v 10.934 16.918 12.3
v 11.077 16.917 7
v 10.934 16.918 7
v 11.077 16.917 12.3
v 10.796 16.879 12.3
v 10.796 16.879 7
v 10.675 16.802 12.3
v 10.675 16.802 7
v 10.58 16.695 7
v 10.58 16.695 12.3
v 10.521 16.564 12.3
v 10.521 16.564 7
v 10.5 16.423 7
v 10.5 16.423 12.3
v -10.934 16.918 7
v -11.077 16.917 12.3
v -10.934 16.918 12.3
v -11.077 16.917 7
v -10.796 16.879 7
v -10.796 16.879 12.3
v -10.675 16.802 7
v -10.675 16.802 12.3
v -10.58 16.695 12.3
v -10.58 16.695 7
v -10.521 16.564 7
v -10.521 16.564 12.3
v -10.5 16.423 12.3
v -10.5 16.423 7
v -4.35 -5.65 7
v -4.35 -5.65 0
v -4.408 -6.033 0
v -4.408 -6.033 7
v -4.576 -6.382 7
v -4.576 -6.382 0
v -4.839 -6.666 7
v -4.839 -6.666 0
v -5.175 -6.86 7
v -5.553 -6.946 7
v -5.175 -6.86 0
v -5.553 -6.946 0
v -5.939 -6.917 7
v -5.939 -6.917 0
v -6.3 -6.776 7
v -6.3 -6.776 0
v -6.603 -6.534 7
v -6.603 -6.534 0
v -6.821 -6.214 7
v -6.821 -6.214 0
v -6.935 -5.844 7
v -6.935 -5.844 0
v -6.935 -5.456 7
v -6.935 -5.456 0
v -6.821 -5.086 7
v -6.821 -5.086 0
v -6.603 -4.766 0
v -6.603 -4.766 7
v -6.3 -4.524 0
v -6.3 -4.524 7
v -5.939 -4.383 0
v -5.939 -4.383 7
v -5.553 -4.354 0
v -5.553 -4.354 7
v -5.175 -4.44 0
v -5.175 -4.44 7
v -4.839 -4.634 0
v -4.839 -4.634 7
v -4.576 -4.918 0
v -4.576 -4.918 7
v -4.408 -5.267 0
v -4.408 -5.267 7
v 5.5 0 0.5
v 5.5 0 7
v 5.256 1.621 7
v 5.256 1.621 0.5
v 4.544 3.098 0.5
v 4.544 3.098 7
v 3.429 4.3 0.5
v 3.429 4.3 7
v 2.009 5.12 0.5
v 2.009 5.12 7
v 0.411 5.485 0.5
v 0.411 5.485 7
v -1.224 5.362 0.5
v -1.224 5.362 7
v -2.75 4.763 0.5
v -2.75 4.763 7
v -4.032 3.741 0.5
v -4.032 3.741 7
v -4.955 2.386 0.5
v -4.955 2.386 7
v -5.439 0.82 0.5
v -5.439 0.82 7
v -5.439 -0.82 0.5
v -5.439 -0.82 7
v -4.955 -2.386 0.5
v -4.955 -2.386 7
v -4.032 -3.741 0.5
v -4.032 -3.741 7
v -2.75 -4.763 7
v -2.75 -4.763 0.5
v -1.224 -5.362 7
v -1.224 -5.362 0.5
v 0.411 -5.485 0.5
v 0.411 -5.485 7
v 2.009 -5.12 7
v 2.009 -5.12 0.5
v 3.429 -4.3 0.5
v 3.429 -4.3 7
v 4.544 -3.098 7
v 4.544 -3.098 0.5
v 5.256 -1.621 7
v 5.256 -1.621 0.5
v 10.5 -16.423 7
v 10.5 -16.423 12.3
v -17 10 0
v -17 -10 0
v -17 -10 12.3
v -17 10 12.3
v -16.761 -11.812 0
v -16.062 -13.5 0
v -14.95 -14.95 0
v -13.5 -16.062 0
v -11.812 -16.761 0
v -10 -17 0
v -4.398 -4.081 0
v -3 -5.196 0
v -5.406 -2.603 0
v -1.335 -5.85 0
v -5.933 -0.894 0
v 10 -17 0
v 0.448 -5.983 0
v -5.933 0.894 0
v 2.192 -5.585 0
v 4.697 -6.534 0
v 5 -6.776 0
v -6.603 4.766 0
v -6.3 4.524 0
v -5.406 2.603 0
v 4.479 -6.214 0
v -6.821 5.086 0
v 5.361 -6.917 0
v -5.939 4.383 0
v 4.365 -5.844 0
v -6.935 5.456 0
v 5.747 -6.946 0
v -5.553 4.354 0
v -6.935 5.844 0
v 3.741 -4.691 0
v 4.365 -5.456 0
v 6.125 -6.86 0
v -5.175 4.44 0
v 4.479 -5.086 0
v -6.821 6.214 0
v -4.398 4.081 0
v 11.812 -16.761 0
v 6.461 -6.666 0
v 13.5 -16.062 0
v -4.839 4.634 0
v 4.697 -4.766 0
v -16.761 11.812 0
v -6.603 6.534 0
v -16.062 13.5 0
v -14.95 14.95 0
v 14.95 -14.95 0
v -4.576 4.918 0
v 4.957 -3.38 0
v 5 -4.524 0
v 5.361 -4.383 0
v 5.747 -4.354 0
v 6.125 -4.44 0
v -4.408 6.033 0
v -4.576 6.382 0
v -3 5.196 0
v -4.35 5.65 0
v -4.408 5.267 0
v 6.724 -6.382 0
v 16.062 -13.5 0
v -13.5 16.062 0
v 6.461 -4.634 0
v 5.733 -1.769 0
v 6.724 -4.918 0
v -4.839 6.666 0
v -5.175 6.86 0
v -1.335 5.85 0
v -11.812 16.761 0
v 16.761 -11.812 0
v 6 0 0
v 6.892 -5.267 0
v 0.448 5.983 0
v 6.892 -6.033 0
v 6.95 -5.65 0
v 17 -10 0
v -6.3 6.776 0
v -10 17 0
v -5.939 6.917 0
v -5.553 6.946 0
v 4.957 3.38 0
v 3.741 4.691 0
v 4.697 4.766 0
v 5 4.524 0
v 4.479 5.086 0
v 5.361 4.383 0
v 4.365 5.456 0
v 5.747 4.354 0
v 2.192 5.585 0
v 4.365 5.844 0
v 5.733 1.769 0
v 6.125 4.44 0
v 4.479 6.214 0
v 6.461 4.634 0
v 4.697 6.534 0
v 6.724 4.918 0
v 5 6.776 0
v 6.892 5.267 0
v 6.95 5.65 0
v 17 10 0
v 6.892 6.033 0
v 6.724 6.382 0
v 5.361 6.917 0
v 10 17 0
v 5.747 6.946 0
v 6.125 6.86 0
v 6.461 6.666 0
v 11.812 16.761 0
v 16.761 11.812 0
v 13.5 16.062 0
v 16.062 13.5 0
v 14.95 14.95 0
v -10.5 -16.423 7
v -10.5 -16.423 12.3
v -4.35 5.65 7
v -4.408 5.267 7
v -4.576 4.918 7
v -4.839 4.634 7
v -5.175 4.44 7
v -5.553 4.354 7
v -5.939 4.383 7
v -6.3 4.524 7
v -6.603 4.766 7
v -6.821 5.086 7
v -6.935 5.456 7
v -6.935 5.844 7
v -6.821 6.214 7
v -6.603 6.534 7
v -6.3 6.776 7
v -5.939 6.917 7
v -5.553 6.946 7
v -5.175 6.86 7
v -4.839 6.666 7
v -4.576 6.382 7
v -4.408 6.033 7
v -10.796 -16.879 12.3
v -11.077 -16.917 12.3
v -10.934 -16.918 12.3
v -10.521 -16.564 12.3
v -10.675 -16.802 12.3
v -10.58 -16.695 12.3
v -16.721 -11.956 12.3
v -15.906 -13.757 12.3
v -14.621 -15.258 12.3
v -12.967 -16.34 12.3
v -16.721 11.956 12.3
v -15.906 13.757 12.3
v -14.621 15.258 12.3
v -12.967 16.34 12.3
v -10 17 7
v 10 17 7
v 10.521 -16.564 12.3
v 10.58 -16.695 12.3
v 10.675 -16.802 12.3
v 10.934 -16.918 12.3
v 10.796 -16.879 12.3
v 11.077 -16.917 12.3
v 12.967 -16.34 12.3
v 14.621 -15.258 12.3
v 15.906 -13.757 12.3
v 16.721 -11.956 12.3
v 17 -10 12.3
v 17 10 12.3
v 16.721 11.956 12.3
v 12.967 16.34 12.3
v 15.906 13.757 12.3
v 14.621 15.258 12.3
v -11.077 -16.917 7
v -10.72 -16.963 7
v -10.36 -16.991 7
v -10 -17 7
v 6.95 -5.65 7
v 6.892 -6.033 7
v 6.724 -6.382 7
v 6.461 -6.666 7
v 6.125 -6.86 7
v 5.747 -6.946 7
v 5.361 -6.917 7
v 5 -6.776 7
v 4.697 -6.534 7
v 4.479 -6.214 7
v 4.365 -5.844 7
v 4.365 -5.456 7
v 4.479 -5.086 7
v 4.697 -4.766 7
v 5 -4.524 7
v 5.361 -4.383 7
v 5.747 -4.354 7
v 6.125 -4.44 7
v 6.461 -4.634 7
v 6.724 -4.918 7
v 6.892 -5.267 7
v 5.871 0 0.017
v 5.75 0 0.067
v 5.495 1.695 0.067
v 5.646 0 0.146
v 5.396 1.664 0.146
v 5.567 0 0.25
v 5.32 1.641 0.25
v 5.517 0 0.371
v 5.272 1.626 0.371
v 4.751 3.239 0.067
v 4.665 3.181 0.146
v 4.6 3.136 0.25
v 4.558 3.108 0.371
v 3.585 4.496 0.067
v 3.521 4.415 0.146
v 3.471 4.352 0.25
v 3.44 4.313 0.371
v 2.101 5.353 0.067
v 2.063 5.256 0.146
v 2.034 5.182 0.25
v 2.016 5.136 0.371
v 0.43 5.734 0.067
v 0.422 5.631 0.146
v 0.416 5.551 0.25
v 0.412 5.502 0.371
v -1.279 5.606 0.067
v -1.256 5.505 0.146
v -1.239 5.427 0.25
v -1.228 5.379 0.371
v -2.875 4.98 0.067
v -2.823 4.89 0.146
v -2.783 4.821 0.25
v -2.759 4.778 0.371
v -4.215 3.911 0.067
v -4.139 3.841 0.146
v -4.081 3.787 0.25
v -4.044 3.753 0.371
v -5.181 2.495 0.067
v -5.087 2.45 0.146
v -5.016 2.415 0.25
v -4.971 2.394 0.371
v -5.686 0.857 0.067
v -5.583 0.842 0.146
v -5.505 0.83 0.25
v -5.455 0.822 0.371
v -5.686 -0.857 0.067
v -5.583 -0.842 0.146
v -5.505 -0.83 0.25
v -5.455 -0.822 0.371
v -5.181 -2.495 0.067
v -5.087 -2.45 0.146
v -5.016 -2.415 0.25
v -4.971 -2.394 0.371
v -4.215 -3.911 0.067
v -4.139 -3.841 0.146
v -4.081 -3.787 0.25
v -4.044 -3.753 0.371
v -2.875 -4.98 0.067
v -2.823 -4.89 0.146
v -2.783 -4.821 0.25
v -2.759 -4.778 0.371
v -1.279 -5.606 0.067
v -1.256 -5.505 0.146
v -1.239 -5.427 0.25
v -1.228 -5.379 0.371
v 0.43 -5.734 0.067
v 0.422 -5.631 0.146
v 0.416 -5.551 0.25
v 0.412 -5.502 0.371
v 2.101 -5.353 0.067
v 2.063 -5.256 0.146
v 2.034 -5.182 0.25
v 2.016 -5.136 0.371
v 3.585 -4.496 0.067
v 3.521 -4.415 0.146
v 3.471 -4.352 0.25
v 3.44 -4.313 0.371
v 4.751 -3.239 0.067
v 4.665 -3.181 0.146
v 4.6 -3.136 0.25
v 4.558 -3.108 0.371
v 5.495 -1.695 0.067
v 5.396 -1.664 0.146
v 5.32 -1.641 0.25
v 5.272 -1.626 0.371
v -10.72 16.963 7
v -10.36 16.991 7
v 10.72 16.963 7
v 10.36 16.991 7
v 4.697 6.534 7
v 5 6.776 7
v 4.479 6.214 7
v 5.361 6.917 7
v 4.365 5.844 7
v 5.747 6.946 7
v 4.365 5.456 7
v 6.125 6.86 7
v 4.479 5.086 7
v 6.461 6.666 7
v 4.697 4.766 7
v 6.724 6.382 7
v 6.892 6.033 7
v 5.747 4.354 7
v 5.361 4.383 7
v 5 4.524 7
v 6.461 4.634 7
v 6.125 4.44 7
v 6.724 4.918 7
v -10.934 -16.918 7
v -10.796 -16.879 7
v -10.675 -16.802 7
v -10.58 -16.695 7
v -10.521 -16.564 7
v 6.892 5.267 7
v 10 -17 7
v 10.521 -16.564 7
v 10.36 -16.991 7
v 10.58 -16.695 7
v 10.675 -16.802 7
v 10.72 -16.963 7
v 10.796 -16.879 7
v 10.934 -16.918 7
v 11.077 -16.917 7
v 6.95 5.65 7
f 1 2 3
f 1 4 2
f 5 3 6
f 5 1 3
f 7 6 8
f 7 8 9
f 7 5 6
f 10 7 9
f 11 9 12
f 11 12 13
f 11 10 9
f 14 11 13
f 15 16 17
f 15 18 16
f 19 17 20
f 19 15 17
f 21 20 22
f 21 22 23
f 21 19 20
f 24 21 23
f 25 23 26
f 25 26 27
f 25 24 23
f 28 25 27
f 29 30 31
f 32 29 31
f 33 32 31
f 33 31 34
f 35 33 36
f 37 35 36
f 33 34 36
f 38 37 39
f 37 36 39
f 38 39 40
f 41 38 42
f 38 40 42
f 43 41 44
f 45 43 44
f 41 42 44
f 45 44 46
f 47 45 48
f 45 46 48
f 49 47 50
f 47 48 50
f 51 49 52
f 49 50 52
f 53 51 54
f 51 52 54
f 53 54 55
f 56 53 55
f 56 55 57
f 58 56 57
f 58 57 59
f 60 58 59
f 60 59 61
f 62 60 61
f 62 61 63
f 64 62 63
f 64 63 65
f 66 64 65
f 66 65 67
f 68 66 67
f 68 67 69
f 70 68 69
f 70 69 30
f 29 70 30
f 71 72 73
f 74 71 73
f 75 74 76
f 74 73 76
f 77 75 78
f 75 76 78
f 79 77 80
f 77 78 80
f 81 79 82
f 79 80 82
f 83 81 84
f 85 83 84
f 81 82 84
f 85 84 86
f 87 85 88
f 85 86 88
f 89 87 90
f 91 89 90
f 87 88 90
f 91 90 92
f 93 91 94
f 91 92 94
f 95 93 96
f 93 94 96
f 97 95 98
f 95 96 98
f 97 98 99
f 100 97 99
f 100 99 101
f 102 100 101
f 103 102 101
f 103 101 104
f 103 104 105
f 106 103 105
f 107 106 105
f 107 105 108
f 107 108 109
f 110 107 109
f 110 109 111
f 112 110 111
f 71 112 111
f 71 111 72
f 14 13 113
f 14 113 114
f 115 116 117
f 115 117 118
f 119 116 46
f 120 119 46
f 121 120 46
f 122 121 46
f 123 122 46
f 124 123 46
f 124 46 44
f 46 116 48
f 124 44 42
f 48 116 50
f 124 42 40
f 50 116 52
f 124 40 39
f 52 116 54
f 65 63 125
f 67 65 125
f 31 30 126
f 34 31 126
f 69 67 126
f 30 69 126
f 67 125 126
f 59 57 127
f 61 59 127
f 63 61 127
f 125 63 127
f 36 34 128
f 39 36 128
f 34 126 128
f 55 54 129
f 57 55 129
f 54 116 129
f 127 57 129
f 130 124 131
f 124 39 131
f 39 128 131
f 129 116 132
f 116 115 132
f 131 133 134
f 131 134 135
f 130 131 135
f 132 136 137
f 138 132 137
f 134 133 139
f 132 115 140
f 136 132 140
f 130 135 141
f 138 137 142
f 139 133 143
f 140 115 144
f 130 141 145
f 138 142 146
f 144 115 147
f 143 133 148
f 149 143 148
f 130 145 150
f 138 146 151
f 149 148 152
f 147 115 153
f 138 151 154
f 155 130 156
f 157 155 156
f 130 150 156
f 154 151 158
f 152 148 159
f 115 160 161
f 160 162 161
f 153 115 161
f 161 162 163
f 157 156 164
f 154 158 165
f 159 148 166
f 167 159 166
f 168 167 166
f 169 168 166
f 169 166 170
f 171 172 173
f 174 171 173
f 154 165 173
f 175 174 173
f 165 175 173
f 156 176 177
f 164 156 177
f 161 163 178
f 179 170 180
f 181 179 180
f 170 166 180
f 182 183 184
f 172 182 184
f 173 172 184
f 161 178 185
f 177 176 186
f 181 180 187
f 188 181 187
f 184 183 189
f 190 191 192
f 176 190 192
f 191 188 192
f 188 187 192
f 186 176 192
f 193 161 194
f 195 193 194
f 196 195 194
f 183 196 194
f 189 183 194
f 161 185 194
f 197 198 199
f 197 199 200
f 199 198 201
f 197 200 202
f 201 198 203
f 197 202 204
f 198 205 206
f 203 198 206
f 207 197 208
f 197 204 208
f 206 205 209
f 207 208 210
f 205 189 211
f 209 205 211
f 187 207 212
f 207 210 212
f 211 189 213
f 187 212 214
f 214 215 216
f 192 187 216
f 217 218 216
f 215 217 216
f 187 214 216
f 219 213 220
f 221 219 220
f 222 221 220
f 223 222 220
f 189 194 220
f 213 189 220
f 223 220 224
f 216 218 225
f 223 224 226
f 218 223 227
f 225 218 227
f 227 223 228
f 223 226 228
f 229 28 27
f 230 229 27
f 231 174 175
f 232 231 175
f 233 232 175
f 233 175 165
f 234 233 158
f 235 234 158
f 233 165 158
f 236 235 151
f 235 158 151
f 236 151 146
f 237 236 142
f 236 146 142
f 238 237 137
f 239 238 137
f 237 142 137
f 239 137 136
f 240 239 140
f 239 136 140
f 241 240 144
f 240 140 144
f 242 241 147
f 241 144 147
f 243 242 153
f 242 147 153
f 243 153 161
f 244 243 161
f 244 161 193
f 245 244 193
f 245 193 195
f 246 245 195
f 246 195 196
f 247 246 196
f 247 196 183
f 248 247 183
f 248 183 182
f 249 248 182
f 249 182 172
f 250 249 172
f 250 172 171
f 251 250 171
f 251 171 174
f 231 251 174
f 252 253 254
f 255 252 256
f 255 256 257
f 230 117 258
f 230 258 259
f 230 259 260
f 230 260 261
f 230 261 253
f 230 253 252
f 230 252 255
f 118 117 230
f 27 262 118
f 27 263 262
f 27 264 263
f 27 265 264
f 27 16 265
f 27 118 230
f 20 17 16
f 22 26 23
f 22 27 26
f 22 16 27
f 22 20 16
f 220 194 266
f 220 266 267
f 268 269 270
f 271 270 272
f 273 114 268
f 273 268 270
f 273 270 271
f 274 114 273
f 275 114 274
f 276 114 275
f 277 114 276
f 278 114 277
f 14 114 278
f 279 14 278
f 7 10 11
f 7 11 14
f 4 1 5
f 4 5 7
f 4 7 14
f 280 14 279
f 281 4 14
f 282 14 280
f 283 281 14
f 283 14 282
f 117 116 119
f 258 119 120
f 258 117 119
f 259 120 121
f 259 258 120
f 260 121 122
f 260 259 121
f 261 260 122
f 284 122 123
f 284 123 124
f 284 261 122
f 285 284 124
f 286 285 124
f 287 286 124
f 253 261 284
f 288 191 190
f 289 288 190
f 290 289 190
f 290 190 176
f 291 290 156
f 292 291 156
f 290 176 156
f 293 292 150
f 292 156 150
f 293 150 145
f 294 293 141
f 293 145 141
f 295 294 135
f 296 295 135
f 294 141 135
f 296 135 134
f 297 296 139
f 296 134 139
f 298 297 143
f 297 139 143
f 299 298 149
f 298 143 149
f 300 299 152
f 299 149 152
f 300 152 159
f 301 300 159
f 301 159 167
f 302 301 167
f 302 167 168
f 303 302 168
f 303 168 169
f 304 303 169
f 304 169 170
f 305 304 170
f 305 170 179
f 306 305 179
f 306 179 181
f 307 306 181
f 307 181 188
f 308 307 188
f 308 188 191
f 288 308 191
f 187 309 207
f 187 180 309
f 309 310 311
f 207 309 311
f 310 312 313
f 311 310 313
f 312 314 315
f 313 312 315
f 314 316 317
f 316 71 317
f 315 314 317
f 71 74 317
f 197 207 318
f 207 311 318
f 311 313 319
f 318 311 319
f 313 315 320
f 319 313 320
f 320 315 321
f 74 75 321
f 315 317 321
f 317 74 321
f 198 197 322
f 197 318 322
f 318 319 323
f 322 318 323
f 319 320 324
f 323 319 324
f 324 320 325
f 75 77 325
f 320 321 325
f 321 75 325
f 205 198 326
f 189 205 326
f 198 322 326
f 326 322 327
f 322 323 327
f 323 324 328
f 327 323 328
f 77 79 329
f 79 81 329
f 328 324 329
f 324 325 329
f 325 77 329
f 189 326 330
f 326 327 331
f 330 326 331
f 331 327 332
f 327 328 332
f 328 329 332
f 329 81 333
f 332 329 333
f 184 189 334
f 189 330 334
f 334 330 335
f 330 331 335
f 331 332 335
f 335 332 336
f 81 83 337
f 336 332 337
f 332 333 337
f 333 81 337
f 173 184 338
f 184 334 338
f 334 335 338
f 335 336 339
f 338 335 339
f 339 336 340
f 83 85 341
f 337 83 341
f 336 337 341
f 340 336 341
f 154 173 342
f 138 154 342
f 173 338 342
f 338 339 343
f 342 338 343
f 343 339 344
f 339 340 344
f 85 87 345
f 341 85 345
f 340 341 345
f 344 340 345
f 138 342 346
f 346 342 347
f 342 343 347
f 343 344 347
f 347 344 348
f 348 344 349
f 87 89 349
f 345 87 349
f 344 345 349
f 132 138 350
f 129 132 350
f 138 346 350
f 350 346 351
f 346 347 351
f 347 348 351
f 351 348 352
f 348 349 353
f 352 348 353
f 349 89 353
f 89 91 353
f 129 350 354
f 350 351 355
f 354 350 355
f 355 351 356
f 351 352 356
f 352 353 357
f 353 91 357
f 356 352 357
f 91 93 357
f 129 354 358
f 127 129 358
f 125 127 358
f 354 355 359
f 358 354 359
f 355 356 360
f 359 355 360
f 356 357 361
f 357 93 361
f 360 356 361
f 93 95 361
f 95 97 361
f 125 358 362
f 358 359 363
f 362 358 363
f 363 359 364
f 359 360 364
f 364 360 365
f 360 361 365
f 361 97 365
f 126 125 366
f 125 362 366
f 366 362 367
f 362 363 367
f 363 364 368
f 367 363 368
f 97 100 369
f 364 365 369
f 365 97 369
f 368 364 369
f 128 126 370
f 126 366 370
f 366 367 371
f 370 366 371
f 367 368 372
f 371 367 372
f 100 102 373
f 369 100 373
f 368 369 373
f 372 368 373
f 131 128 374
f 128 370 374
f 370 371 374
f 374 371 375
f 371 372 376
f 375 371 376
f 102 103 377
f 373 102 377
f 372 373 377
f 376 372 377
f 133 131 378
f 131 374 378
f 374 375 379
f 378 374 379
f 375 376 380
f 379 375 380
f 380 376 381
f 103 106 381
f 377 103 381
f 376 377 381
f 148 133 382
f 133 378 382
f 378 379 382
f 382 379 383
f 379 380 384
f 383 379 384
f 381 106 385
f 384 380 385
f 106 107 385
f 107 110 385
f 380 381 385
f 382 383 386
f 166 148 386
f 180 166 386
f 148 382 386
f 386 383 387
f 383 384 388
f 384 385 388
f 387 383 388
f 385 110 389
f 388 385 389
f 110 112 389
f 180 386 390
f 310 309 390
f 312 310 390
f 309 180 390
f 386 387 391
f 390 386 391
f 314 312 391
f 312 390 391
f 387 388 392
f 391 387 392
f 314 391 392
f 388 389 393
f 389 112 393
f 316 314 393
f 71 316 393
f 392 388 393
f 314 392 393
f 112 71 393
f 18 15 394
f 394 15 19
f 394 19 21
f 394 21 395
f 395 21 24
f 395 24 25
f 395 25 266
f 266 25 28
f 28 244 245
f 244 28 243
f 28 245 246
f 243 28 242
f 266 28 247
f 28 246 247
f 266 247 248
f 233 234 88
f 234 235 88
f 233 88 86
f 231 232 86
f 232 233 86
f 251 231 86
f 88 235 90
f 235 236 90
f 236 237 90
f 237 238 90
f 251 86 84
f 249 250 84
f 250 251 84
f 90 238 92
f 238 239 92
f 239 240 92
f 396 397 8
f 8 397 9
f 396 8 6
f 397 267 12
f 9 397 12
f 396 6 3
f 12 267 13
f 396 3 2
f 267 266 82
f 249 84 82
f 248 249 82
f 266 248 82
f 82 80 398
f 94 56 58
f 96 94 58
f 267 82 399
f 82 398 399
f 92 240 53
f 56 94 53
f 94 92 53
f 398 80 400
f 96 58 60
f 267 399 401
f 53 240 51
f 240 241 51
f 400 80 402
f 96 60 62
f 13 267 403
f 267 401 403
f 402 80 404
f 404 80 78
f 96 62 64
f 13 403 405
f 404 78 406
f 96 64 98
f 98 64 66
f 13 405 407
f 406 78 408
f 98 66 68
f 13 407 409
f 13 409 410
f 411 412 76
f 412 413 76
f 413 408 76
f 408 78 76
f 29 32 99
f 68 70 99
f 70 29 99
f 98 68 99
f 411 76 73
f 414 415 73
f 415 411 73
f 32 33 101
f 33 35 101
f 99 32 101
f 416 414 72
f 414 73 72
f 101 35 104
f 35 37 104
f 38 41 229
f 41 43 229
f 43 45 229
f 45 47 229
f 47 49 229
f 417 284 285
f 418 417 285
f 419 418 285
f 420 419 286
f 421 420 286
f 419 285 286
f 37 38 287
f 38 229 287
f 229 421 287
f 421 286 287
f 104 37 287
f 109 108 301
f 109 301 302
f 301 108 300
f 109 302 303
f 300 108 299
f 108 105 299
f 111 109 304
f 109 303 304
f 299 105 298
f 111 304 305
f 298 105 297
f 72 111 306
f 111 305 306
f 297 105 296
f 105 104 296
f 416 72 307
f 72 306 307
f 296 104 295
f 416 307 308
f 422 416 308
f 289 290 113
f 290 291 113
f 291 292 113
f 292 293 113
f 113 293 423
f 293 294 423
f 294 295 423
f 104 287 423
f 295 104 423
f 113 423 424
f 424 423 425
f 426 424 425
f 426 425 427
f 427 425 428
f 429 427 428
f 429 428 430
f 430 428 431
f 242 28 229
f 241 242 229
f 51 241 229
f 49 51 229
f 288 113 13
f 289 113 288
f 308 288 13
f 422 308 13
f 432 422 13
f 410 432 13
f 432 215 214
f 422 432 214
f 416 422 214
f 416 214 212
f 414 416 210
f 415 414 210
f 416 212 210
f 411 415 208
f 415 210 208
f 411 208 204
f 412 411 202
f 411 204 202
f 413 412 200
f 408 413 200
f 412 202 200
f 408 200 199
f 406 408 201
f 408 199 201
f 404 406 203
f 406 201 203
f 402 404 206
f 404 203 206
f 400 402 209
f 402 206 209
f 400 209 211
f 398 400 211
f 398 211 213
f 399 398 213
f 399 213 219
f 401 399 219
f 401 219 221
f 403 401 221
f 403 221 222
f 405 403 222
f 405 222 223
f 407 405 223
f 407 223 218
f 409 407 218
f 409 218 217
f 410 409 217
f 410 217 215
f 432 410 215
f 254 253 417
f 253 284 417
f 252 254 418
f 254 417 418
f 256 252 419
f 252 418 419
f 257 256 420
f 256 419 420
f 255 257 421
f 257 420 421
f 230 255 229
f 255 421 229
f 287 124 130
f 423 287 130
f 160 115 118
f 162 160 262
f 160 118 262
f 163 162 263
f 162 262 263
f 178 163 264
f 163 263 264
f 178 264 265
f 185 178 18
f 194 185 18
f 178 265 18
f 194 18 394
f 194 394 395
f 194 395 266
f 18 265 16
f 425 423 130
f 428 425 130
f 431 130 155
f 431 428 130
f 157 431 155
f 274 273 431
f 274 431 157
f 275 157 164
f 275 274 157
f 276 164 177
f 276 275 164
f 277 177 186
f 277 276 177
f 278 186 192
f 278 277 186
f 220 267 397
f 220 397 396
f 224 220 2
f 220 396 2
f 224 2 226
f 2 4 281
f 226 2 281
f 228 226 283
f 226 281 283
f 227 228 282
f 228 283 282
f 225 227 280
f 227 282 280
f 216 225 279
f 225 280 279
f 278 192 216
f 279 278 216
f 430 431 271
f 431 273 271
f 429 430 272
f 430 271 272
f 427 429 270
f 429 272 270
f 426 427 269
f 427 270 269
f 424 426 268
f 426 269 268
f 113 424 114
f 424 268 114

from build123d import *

# Parameters (mm, degrees)
F0_W     = 34
F0_H     = 34
F1_DEPTH = 12.3
F2_R     = 5.5
F3_DEPTH = 12.301
F4_R     = 1.3
F5_DEPTH = 12.301
F6_W     = 21
F6_H     = 5.3
F7_DEPTH = 34.001
F8_R     = 7
F9_R     = 0.5


with BuildPart() as f1:
    # F0 (on Top) → F1 (new body)
    with BuildSketch(Plane.XY):
        Rectangle(F0_W, F0_H)
    extrude(amount=F1_DEPTH)

    # F2 (on face) → F3 (cut, through all)
    with BuildSketch(Plane.XY.offset(12.3)):
        Circle(F2_R)
    extrude(amount=-F3_DEPTH, mode=Mode.SUBTRACT)

    # F4 (on face) → F5 (cut, through all)
    with BuildSketch(Plane(origin=(0, 0, 0), x_dir=(1, 0, 0), z_dir=(0, 0, -1))):
        with Locations((-5.65, 5.65)):
            Circle(F4_R)
        with Locations((-5.65, -5.65)):
            Circle(F4_R)
        with Locations((5.65, 5.65)):
            Circle(F4_R)
        with Locations((5.65, -5.65)):
            Circle(F4_R)
    extrude(amount=-F5_DEPTH, mode=Mode.SUBTRACT)

    # F6 (on face) → F7 (cut, through all)
    with BuildSketch(Plane.XZ.offset(17)):
        with Locations((0, 9.65)):
            Rectangle(F6_W, F6_H)
    extrude(amount=-F7_DEPTH, mode=Mode.SUBTRACT)

    # F8
    f8_edges = [f1.edges().sort_by_distance(p)[0] for p in [
        (-17, -17, 6.15),
        (17, -17, 6.15),
        (17, 17, 6.15),
        (-17, 17, 6.15),
    ]]
    fillet(f8_edges, radius=F8_R)

    # F9
    f9_edges = [f1.edges().sort_by_distance(p)[0] for p in [
        (-5.5, 0, 0),
        (-10.5, 16.98212, 9.65),
        (-10.5, -16.98212, 9.65),
        (10.5, -16.98212, 9.65),
        (10.5, 16.98212, 9.65),
    ]]
    fillet(f9_edges, radius=F9_R)


solid = f1.part
